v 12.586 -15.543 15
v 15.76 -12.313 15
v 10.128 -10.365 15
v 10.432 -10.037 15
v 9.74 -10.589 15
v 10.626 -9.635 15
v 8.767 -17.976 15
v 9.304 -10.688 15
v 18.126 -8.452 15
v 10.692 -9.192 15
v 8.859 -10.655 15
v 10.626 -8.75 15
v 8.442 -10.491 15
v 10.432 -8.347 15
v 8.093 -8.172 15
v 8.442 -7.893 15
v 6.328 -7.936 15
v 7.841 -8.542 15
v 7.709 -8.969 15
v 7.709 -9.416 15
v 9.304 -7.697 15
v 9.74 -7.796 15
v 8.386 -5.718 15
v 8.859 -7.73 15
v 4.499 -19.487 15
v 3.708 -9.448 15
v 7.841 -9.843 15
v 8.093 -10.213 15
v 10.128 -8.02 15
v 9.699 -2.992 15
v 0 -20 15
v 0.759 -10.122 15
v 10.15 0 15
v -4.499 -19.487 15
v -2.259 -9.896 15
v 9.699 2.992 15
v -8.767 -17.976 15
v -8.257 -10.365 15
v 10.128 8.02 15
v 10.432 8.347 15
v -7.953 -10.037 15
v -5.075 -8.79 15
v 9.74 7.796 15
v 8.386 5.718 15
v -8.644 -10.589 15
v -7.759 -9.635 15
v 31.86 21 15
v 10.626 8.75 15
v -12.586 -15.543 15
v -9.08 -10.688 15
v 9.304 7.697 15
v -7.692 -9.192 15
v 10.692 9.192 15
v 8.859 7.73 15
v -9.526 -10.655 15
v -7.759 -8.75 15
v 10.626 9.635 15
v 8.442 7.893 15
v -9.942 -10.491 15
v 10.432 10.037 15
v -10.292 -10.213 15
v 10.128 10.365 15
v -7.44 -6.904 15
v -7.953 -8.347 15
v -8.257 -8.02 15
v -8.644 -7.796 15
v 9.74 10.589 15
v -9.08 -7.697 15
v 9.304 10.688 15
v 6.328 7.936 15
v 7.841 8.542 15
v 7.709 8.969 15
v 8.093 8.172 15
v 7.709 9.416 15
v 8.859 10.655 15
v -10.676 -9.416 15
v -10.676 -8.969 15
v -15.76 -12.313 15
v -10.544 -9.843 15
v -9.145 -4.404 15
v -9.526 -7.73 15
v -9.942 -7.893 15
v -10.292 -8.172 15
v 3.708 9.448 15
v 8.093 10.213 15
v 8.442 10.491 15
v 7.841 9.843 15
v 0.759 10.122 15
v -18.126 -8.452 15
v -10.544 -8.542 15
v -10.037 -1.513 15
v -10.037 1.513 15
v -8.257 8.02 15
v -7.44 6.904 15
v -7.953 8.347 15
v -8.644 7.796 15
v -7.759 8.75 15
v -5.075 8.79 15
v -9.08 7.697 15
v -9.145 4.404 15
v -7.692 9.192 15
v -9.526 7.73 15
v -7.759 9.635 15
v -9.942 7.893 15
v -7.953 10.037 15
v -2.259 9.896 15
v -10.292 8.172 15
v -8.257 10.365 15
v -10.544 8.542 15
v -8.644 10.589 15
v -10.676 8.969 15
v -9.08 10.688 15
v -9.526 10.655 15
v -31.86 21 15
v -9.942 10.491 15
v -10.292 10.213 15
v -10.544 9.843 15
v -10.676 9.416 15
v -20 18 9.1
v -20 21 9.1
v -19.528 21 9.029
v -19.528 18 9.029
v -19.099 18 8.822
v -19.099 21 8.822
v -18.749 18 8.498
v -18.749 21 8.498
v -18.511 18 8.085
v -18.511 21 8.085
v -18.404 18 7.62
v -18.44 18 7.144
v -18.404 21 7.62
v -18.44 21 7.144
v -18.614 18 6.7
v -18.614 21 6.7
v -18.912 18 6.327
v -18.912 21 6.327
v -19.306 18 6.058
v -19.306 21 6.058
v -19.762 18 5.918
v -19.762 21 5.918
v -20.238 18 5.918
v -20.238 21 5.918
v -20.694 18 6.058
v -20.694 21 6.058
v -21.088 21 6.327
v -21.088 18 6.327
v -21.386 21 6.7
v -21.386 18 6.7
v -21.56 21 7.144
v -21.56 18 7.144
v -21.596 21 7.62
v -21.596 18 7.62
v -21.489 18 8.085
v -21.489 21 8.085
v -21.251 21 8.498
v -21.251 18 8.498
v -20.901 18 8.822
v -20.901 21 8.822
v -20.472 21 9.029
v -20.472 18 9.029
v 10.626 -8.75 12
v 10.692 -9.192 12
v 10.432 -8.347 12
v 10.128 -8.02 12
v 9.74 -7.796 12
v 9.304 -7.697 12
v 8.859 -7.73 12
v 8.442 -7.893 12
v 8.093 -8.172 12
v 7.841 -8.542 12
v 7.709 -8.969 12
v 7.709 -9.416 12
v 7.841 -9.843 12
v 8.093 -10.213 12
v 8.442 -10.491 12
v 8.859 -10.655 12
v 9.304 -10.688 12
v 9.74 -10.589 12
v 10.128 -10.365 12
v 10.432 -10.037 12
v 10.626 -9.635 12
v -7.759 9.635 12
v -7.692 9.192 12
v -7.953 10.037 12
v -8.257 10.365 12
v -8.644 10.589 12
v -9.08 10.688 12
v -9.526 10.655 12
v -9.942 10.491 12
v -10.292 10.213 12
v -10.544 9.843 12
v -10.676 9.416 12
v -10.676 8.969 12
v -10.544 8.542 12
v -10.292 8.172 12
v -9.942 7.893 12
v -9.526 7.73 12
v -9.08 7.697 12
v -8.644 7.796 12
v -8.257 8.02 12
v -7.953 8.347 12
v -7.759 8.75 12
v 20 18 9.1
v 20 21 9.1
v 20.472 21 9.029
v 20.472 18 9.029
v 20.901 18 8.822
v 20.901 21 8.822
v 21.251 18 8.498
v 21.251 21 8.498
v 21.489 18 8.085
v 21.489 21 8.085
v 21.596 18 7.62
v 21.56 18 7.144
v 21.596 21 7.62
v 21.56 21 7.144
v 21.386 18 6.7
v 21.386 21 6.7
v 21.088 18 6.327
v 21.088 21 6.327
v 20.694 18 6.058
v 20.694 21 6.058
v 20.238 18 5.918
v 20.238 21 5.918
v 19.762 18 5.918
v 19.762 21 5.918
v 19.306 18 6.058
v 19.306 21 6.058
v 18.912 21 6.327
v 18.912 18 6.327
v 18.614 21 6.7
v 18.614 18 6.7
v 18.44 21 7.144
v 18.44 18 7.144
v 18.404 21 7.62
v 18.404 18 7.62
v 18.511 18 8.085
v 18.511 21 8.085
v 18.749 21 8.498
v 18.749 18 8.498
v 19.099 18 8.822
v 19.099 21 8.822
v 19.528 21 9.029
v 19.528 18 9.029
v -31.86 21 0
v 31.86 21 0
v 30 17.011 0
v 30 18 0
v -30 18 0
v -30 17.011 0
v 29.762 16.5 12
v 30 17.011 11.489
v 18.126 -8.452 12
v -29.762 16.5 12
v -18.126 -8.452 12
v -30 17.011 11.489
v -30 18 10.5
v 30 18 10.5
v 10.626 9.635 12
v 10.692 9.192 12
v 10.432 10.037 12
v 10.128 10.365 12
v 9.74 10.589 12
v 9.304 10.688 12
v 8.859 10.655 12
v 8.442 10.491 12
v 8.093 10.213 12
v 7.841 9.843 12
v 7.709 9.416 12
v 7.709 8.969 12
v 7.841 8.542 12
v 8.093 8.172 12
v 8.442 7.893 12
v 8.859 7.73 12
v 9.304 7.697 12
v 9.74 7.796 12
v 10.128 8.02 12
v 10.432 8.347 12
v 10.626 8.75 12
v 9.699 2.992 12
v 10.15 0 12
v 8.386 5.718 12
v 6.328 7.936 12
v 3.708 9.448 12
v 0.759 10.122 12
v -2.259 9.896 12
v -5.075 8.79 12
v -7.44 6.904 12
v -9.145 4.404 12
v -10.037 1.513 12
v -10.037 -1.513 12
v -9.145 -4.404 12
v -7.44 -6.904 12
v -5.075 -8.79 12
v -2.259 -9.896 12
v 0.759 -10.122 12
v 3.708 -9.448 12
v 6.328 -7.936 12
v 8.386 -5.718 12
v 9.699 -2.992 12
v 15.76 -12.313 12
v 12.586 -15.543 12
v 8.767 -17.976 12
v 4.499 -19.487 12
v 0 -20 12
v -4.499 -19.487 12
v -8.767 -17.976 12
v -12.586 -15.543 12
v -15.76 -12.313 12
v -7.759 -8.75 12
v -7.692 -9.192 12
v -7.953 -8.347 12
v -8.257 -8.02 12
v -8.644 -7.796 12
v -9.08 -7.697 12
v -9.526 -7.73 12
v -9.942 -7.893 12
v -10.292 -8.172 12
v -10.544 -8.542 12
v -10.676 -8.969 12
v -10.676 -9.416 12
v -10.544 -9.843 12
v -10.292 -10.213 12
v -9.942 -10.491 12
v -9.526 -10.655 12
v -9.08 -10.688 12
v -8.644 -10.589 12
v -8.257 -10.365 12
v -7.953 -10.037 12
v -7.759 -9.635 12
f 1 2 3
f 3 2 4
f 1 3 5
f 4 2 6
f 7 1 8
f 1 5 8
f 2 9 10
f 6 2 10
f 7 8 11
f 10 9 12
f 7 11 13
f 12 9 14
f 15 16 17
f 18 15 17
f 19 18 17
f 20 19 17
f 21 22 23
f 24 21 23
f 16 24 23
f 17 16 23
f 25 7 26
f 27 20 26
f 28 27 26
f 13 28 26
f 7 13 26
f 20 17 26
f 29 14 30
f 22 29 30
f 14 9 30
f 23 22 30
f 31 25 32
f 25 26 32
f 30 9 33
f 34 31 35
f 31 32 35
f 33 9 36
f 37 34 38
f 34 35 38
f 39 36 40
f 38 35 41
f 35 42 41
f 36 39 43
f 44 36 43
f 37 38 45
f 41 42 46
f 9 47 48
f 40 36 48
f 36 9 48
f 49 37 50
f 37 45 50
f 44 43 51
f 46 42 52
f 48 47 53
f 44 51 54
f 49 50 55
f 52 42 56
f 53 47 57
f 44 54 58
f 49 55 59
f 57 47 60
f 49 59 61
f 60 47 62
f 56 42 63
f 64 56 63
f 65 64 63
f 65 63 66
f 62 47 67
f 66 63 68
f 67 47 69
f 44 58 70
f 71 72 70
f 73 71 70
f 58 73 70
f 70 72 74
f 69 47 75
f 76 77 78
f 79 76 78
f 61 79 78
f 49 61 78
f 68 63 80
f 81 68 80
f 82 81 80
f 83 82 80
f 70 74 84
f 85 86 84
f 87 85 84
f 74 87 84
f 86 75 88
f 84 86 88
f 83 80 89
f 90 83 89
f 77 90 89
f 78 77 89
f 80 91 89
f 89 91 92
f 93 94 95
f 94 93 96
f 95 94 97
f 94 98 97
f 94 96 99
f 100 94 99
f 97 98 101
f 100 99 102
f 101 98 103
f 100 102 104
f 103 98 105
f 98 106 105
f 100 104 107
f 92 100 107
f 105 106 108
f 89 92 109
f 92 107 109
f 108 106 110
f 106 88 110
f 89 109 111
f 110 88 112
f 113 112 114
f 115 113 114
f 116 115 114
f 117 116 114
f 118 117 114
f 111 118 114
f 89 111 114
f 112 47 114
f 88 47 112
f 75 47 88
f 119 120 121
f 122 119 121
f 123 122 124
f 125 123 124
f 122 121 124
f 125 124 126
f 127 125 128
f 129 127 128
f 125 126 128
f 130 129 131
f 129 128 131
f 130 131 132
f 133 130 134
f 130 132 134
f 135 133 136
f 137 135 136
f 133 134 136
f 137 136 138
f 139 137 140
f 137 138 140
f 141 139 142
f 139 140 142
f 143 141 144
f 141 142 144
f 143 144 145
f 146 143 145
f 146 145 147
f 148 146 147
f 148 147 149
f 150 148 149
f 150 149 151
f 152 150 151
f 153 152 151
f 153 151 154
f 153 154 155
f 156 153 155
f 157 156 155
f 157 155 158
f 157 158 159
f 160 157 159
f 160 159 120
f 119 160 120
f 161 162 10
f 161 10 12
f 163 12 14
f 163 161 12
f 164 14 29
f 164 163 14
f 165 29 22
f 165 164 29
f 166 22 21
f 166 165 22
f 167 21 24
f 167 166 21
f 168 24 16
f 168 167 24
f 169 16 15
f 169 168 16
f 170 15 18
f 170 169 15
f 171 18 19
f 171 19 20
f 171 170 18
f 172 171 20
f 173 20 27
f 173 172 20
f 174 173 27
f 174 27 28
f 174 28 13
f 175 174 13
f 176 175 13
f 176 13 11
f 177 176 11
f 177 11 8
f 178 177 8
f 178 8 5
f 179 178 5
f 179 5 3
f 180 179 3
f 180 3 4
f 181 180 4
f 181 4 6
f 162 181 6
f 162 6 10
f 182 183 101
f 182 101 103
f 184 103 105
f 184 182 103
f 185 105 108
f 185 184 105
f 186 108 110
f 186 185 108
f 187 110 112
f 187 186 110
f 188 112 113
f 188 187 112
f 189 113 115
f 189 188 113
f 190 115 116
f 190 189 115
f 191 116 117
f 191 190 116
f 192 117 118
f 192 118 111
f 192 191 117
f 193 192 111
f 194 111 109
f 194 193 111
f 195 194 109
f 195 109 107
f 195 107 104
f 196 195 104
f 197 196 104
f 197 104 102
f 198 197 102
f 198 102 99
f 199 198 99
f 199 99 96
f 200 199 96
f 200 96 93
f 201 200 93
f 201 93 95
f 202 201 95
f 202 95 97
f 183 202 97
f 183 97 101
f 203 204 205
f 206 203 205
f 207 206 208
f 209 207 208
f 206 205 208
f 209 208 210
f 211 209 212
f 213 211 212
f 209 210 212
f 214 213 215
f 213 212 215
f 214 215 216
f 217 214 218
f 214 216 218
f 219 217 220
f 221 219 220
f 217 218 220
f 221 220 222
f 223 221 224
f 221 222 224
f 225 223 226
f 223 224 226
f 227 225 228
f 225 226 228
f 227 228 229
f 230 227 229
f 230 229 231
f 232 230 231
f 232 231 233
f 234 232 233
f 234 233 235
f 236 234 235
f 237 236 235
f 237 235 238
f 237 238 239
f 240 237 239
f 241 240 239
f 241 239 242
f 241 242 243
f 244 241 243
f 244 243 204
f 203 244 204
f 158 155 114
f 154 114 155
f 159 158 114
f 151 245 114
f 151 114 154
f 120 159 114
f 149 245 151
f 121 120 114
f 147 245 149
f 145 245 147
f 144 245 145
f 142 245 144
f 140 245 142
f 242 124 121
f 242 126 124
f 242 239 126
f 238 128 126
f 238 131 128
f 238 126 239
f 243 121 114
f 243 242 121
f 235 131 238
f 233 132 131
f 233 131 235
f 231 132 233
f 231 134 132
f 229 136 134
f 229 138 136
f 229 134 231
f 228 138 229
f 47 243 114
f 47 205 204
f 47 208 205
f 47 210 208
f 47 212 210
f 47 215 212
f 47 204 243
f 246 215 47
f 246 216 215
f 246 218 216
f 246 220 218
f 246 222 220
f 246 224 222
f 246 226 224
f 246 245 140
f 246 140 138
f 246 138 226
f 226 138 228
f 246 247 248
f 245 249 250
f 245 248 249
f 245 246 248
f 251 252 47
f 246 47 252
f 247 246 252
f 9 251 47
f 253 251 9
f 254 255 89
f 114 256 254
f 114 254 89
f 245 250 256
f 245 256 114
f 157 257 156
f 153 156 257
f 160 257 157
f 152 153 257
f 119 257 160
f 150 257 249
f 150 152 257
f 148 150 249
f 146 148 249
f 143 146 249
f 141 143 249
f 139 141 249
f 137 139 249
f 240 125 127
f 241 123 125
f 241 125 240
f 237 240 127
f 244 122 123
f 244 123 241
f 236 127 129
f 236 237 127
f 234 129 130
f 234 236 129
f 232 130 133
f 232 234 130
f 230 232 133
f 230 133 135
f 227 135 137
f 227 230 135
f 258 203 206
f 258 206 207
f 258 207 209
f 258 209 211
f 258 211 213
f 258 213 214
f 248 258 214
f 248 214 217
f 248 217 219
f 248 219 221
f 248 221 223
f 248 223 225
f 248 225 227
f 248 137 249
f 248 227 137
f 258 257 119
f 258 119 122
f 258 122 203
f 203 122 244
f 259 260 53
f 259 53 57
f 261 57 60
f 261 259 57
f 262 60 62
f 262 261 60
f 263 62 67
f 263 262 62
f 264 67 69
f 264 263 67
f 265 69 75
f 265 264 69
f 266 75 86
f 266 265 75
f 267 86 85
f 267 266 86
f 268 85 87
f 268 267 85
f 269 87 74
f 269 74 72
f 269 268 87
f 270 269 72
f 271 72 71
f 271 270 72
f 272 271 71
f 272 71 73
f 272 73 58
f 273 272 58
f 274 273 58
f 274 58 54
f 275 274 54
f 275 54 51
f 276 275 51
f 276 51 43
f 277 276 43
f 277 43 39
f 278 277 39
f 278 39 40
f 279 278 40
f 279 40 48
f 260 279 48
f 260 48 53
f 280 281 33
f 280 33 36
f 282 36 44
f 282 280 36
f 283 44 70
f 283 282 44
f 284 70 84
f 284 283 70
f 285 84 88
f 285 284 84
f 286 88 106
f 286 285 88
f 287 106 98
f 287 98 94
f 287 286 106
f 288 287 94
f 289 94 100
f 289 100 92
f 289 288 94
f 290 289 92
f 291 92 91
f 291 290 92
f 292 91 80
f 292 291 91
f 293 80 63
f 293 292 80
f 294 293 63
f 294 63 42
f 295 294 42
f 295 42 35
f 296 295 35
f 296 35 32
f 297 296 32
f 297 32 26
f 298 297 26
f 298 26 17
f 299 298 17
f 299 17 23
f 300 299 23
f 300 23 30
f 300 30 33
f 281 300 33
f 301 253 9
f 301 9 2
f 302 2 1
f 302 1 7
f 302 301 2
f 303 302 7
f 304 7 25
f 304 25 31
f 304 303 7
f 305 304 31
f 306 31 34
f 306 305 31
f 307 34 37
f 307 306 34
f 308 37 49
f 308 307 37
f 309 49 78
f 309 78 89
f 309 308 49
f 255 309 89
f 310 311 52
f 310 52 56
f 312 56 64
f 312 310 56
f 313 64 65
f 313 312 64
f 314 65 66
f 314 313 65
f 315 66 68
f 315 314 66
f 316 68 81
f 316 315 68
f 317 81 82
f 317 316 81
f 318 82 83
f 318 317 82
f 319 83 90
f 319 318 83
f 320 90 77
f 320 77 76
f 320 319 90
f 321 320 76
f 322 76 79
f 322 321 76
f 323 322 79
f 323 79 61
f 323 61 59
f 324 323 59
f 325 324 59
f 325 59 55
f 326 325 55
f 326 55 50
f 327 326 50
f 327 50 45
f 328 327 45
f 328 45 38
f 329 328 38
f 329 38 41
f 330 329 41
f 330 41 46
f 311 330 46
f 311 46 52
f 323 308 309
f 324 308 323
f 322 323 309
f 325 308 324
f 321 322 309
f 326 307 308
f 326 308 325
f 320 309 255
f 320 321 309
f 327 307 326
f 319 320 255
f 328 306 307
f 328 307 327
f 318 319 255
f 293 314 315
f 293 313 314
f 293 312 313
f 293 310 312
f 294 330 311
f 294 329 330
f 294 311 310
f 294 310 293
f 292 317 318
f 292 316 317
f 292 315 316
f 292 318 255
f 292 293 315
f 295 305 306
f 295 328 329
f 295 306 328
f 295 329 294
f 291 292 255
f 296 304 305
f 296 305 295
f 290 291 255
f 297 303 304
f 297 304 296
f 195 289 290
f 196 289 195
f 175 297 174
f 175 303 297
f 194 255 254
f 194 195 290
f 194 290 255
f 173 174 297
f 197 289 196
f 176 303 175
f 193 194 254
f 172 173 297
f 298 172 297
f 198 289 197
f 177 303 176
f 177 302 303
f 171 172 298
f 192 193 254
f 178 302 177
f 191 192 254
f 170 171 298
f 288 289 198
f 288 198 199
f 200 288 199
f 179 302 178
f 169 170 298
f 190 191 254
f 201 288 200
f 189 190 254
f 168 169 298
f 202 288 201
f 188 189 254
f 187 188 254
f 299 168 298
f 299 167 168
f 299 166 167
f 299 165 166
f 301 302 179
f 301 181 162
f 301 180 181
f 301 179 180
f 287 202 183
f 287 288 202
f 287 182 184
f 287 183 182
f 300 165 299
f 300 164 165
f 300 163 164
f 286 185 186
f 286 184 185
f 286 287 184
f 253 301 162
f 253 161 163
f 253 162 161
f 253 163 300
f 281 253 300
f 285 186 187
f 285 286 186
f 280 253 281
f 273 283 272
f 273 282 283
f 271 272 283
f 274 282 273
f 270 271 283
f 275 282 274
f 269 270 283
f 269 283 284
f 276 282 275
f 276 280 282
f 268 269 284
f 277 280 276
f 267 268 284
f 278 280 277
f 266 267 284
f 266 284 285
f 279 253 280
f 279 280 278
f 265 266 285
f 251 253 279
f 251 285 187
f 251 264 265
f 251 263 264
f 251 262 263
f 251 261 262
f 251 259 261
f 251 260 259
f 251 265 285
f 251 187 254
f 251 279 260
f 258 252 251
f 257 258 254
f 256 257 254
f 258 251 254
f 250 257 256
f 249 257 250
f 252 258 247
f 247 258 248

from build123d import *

# Parameters (mm, degrees)
SKETCH_1_R          = 10.15
SKETCH_1_R_2        = 1.5
EXTRUDE_1_DEPTH     = 15
SKETCH_2_W          = 12
SKETCH_2_H          = 38
CUT_EXTRUDE_1_DEPTH = 30
CHAMFER_1_SIZE      = 1.5
CUT_EXTRUDE_2_REACH = 56.047
SKETCH_3_R          = 1.6


with BuildPart() as part:
    # ｽｹｯﾁ1 → ﾎﾞｽ - 押し出し1 (new body)
    with BuildSketch(Plane.XY):
        with BuildLine():
            Line((-18.126155741, -8.452365235), (-31.860019201, 21))
            Line((-31.860019201, 21), (31.860019201, 21))
            Line((31.860019201, 21), (18.126155741, -8.452365235))
            ThreePointArc((18.126155741, -8.452365235), (0, -20), (-18.126155741, -8.452365235))
        make_face()
        Circle(SKETCH_1_R, mode=Mode.SUBTRACT)
        with Locations((-9.192388155, 9.192388155)):
            Circle(SKETCH_1_R_2, mode=Mode.SUBTRACT)
        with Locations((9.192388155, 9.192388155)):
            Circle(SKETCH_1_R_2, mode=Mode.SUBTRACT)
        with Locations((-9.192388155, -9.192388155)):
            Circle(SKETCH_1_R_2, mode=Mode.SUBTRACT)
        with Locations((9.192388155, -9.192388155)):
            Circle(SKETCH_1_R_2, mode=Mode.SUBTRACT)
    extrude(amount=EXTRUDE_1_DEPTH)

    # ｽｹｯﾁ2 → ｶｯﾄ - 押し出し1 (cut, symmetric)
    with BuildSketch(Plane(origin=(0, 0, 0), x_dir=(0, 0, -1), z_dir=(1, 0, 0))):
        with Locations((-6, -1)):
            Rectangle(SKETCH_2_W, SKETCH_2_H)
    extrude(amount=CUT_EXTRUDE_1_DEPTH, both=True, mode=Mode.SUBTRACT)

    # 面取り1
    chamfer_1_edges = [part.edges().sort_by_distance(p)[0] for p in [
        (0, 18, 12),
    ]]
    chamfer(chamfer_1_edges, length=CHAMFER_1_SIZE)

    # ｽｹｯﾁ3 → ｶｯﾄ - 押し出し2 (cut, up to next)
    with BuildSketch(Plane(origin=(0, 21, 0), x_dir=(1, 0, 0), z_dir=(0, 1, 0)), mode=Mode.PRIVATE) as cut_extrude_2_sk1:
        with Locations(Location((-20, -7.5, 0), (0, 0, 270))):
            Circle(SKETCH_3_R)
    cut_extrude_2_tool1 = extrude(cut_extrude_2_sk1.sketch, amount=-CUT_EXTRUDE_2_REACH, mode=Mode.PRIVATE) & part.part
    # ｽｹｯﾁ3 → ｶｯﾄ - 押し出し2 (cut, up to next)
    with BuildSketch(Plane(origin=(0, 21, 0), x_dir=(1, 0, 0), z_dir=(0, 1, 0)), mode=Mode.PRIVATE) as cut_extrude_2_sk2:
        with Locations(Location((20, -7.5, 0), (0, 0, 270))):
            Circle(SKETCH_3_R)
    cut_extrude_2_tool2 = extrude(cut_extrude_2_sk2.sketch, amount=-CUT_EXTRUDE_2_REACH, mode=Mode.PRIVATE) & part.part
    add(cut_extrude_2_tool1.solids().sort_by_distance((-20, 21, 7.5))[0], mode=Mode.SUBTRACT)
    add(cut_extrude_2_tool2.solids().sort_by_distance((20, 21, 7.5))[0], mode=Mode.SUBTRACT)


solid = part.part
